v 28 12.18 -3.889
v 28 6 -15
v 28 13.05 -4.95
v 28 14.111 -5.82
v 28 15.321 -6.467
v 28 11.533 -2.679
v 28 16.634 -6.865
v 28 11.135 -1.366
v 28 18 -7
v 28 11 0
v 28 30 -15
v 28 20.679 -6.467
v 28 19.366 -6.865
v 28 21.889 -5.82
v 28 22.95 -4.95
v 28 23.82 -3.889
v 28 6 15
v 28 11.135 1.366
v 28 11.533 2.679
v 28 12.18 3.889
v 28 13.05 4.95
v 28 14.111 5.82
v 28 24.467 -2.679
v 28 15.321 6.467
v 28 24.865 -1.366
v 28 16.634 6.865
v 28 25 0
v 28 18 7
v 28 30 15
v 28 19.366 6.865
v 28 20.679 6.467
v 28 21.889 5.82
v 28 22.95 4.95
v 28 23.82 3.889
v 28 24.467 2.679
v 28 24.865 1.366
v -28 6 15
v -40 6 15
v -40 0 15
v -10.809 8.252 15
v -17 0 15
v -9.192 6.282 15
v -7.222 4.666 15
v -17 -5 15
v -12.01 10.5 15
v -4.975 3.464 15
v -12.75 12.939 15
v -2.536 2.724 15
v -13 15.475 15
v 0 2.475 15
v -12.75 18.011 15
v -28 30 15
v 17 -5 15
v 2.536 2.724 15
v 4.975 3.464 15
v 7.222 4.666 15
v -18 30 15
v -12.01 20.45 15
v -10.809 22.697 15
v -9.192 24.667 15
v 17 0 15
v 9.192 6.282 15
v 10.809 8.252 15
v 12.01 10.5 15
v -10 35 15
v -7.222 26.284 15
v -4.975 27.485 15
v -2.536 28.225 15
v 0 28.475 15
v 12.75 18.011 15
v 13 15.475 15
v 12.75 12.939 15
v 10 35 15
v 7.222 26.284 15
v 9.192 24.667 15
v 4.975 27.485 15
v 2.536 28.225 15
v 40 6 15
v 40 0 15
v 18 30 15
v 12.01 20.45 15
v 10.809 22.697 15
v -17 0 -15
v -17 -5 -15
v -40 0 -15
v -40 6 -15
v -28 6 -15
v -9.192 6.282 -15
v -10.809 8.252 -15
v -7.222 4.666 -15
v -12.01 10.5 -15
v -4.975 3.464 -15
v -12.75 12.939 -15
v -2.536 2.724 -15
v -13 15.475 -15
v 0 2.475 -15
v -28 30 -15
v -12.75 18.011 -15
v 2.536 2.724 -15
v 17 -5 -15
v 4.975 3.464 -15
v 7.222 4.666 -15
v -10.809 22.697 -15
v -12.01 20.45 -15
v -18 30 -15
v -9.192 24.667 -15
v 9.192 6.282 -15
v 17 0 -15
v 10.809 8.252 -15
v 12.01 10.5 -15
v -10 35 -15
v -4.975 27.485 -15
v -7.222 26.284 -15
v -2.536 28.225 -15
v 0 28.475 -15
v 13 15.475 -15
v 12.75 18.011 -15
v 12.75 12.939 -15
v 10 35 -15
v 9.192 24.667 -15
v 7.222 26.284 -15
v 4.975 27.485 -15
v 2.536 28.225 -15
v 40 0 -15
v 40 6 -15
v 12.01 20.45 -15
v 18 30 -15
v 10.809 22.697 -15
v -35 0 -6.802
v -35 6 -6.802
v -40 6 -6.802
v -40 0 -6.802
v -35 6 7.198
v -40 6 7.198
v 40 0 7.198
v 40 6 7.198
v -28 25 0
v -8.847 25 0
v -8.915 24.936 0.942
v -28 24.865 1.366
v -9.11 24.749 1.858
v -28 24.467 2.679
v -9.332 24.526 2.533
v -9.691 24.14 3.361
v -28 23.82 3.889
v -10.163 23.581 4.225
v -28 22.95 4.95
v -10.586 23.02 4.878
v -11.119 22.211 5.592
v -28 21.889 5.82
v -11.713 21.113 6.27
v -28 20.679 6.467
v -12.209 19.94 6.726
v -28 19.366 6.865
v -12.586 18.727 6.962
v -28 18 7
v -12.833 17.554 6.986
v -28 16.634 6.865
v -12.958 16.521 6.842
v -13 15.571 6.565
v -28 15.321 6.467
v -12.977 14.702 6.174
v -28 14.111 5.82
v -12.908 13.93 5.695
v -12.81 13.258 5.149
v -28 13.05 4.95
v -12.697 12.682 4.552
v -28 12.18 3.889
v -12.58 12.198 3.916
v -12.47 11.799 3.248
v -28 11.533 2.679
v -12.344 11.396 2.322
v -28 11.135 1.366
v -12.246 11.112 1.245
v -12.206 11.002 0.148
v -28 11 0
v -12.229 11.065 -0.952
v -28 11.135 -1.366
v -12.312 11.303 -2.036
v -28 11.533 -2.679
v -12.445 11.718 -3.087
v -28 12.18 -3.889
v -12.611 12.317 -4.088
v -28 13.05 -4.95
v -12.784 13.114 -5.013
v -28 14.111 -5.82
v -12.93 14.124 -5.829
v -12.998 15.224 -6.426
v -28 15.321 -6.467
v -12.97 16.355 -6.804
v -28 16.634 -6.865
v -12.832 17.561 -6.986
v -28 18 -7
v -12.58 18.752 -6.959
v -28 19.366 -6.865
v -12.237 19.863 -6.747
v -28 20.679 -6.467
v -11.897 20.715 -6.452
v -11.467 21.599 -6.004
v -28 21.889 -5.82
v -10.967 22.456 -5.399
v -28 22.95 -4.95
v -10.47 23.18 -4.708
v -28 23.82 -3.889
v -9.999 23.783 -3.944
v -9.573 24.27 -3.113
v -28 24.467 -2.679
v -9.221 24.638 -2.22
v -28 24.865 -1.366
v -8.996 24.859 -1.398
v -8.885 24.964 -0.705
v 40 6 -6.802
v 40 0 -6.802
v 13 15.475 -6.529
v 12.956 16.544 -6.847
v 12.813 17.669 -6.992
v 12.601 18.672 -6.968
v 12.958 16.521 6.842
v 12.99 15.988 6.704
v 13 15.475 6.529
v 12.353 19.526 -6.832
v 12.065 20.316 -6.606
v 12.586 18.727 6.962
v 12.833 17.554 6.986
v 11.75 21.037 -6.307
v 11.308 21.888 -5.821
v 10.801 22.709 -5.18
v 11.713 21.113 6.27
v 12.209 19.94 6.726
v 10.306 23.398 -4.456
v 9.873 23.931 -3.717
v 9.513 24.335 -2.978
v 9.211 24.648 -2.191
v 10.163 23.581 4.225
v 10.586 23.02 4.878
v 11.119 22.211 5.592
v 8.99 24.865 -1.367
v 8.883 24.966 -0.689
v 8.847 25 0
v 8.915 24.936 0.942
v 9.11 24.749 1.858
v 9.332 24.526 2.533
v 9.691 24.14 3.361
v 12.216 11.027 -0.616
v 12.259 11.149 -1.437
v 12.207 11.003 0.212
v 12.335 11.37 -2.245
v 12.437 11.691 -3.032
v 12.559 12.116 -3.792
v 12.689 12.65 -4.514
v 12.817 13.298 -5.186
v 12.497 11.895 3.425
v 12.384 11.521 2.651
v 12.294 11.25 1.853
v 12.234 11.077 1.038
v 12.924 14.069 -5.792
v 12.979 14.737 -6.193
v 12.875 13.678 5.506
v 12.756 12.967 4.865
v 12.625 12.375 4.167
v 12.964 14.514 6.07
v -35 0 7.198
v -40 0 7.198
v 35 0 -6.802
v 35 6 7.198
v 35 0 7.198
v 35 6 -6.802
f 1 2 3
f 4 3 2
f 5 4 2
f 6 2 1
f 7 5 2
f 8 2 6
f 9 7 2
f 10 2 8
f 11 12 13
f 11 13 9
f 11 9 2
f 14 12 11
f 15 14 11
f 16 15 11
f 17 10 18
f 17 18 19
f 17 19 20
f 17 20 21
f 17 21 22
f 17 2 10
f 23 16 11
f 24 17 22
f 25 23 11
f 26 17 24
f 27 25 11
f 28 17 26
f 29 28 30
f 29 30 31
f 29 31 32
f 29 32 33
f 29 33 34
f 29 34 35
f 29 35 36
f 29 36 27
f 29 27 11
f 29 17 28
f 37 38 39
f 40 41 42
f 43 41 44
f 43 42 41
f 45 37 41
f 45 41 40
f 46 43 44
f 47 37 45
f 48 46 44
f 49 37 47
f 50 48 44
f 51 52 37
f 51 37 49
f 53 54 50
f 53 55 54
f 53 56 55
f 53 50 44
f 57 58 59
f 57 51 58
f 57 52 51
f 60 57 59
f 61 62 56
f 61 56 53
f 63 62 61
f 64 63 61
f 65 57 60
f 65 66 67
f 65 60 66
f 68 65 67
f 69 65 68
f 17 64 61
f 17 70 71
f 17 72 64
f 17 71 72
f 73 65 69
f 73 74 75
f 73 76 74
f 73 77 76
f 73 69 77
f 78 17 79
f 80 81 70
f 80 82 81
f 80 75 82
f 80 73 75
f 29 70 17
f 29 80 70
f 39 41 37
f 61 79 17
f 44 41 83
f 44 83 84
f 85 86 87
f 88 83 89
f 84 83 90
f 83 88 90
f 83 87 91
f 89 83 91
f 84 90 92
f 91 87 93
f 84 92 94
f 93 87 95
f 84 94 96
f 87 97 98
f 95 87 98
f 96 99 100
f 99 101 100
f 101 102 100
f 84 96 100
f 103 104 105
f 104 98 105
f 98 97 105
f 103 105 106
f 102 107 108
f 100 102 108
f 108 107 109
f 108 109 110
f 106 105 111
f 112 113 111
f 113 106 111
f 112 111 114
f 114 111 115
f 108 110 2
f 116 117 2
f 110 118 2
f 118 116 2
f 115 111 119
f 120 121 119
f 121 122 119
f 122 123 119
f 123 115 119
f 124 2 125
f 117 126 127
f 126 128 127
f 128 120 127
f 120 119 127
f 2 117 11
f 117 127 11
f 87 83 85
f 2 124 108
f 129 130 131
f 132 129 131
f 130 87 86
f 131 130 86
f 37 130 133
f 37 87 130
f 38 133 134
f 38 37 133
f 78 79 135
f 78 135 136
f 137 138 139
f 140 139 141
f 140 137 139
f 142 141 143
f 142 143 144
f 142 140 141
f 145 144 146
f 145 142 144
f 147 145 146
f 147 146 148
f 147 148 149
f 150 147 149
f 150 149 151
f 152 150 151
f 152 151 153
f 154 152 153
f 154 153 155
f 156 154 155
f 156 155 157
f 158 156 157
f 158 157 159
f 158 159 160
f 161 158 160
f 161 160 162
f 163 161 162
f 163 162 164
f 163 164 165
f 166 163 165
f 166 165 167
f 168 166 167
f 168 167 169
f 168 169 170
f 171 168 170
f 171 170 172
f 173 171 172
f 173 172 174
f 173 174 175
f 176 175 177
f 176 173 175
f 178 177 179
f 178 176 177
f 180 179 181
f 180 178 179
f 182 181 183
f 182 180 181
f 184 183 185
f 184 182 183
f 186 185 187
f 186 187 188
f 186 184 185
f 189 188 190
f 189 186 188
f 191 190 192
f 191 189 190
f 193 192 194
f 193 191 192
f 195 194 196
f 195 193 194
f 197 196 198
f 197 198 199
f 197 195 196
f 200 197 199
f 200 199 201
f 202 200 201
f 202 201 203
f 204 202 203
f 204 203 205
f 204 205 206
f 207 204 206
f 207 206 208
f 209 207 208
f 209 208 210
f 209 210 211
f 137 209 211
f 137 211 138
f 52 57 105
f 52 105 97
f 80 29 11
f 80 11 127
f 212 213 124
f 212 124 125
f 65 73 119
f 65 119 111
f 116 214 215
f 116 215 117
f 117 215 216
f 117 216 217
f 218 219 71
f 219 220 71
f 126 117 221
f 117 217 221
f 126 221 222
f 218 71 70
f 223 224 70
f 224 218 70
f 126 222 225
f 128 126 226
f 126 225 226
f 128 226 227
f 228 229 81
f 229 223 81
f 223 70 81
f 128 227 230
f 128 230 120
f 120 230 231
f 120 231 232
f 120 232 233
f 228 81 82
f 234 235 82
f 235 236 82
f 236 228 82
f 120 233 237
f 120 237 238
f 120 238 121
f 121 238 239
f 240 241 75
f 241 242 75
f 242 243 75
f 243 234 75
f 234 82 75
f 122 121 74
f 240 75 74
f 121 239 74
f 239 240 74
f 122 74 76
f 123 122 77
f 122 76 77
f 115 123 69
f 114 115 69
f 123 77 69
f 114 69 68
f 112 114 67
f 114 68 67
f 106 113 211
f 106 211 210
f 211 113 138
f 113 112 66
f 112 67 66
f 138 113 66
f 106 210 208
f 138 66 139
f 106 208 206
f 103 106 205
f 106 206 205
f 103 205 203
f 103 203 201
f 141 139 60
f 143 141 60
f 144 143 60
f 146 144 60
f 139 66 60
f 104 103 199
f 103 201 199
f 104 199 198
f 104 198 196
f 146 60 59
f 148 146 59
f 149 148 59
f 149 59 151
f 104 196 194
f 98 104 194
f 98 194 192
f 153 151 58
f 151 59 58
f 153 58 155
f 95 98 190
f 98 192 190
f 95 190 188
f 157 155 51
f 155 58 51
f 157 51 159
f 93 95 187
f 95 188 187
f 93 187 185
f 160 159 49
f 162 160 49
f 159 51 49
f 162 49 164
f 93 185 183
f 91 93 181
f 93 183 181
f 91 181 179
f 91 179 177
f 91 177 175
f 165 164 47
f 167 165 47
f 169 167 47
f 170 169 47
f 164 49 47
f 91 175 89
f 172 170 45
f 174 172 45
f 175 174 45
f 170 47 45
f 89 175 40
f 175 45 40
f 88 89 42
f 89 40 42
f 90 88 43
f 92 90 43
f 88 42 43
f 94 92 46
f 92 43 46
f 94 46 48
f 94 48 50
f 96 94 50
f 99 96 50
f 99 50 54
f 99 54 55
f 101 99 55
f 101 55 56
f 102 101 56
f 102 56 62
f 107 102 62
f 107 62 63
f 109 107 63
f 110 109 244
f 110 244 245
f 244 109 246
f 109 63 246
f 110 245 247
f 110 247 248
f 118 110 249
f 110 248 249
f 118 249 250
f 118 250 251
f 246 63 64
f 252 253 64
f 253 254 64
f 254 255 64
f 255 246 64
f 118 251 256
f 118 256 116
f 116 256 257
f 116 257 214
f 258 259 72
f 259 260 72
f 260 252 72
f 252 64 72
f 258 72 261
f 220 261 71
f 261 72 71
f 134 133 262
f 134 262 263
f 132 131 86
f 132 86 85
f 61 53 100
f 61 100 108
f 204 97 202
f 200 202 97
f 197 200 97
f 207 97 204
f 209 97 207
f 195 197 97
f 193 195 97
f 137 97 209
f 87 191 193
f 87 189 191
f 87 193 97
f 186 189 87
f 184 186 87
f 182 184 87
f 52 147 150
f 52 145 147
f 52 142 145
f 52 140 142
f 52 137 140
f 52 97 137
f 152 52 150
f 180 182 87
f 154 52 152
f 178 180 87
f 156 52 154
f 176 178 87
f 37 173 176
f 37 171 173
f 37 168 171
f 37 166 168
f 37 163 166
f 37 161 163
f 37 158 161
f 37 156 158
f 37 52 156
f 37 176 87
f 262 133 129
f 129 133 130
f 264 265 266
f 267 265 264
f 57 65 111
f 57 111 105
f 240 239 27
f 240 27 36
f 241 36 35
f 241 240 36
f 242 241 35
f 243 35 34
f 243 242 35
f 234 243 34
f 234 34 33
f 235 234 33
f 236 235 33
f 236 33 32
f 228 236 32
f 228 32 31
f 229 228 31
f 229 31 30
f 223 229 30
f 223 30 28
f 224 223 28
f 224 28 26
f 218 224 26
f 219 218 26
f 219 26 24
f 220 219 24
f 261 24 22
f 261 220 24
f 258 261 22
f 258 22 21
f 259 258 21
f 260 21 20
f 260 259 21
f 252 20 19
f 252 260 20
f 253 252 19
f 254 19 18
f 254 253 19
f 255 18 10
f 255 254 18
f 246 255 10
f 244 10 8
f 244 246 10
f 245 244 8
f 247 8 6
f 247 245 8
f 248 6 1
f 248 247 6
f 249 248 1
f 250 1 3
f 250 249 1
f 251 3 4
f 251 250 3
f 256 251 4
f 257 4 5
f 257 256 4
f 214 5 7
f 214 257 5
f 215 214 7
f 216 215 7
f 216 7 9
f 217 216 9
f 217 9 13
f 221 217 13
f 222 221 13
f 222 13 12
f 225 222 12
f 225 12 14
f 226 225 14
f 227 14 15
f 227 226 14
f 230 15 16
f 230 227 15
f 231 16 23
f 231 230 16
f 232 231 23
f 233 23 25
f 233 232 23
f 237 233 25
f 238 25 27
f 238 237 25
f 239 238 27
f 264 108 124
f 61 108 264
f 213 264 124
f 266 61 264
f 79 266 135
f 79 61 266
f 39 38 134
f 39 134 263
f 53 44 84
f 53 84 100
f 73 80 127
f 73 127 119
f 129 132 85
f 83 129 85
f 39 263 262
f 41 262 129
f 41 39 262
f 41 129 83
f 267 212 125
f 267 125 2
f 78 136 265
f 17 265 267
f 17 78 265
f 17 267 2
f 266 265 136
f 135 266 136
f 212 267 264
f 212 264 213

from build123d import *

# Parameters (mm, degrees)
BOSS_EXTRUDE1_DEPTH     = 15
SKETCH2_R               = 13
CUT_EXTRUDE1_DEPTH      = 30
CUT_EXTRUDE2_REACH      = 53.633
SKETCH3_W               = 5
SKETCH3_H               = 14
CUT_EXTRUDE3_DEPTH      = 78.935871074
CUT_EXTRUDE3_DEPTH_BACK = 78.935871074
SKETCH4_R               = 7


with BuildPart() as part:
    # Sketch1 → Boss-Extrude1 (new, symmetric)
    with BuildSketch(Plane.XY):
        Polygon((-40, 0), (-17, 0), (-17, -5), (17, -5), (17, 0), (40, 0), (40, 6), (28, 6), (28, 30), (18, 30), (10, 35), (-10, 35), (-18, 30), (-28, 30), (-28, 6), (-40, 6), align=None)
    extrude(amount=BOSS_EXTRUDE1_DEPTH, both=True)

    # Sketch2 → Cut-Extrude1 (cut)
    with BuildSketch(Plane.XY.offset(15)):
        with Locations((0, 15.474684959)):
            Circle(SKETCH2_R)
    extrude(amount=-CUT_EXTRUDE1_DEPTH, mode=Mode.SUBTRACT)

    # Sketch3 → Cut-Extrude2 (cut, up to next)
    with BuildSketch(Plane(origin=(0, 6, 0), x_dir=(1, 0, 0), z_dir=(0, 1, 0)), mode=Mode.PRIVATE) as cut_extrude2_sk1:
        with Locations((37.5, -0.197950113)):
            Rectangle(SKETCH3_W, SKETCH3_H)
    cut_extrude2_tool1 = extrude(cut_extrude2_sk1.sketch, amount=-CUT_EXTRUDE2_REACH, mode=Mode.PRIVATE) & part.part
    cut_extrude2 = cut_extrude2_tool1.solids().sort_by_distance((37.5, 6, 0.19795))[0]
    add(cut_extrude2, mode=Mode.SUBTRACT)

    # Mirror1: Cut-Extrude2 across plane
    add(cut_extrude2.mirror(Plane(origin=(0, 0, 0), x_dir=(0, 0, 1), z_dir=(1, 0, 0))), mode=Mode.SUBTRACT)

    # Sketch4 → Cut-Extrude3 (cut, two sides: drawn at the far end of the back side and taken through both)
    with BuildSketch(Plane(origin=(28, 0, 0), x_dir=(0, 0, -1), z_dir=(1, 0, 0)).offset(-CUT_EXTRUDE3_DEPTH_BACK)):
        with Locations(Location((0, 18, 0), (0, 0, 90))):
            Circle(SKETCH4_R)
    extrude(amount=CUT_EXTRUDE3_DEPTH + CUT_EXTRUDE3_DEPTH_BACK, mode=Mode.SUBTRACT)


solid = part.part
